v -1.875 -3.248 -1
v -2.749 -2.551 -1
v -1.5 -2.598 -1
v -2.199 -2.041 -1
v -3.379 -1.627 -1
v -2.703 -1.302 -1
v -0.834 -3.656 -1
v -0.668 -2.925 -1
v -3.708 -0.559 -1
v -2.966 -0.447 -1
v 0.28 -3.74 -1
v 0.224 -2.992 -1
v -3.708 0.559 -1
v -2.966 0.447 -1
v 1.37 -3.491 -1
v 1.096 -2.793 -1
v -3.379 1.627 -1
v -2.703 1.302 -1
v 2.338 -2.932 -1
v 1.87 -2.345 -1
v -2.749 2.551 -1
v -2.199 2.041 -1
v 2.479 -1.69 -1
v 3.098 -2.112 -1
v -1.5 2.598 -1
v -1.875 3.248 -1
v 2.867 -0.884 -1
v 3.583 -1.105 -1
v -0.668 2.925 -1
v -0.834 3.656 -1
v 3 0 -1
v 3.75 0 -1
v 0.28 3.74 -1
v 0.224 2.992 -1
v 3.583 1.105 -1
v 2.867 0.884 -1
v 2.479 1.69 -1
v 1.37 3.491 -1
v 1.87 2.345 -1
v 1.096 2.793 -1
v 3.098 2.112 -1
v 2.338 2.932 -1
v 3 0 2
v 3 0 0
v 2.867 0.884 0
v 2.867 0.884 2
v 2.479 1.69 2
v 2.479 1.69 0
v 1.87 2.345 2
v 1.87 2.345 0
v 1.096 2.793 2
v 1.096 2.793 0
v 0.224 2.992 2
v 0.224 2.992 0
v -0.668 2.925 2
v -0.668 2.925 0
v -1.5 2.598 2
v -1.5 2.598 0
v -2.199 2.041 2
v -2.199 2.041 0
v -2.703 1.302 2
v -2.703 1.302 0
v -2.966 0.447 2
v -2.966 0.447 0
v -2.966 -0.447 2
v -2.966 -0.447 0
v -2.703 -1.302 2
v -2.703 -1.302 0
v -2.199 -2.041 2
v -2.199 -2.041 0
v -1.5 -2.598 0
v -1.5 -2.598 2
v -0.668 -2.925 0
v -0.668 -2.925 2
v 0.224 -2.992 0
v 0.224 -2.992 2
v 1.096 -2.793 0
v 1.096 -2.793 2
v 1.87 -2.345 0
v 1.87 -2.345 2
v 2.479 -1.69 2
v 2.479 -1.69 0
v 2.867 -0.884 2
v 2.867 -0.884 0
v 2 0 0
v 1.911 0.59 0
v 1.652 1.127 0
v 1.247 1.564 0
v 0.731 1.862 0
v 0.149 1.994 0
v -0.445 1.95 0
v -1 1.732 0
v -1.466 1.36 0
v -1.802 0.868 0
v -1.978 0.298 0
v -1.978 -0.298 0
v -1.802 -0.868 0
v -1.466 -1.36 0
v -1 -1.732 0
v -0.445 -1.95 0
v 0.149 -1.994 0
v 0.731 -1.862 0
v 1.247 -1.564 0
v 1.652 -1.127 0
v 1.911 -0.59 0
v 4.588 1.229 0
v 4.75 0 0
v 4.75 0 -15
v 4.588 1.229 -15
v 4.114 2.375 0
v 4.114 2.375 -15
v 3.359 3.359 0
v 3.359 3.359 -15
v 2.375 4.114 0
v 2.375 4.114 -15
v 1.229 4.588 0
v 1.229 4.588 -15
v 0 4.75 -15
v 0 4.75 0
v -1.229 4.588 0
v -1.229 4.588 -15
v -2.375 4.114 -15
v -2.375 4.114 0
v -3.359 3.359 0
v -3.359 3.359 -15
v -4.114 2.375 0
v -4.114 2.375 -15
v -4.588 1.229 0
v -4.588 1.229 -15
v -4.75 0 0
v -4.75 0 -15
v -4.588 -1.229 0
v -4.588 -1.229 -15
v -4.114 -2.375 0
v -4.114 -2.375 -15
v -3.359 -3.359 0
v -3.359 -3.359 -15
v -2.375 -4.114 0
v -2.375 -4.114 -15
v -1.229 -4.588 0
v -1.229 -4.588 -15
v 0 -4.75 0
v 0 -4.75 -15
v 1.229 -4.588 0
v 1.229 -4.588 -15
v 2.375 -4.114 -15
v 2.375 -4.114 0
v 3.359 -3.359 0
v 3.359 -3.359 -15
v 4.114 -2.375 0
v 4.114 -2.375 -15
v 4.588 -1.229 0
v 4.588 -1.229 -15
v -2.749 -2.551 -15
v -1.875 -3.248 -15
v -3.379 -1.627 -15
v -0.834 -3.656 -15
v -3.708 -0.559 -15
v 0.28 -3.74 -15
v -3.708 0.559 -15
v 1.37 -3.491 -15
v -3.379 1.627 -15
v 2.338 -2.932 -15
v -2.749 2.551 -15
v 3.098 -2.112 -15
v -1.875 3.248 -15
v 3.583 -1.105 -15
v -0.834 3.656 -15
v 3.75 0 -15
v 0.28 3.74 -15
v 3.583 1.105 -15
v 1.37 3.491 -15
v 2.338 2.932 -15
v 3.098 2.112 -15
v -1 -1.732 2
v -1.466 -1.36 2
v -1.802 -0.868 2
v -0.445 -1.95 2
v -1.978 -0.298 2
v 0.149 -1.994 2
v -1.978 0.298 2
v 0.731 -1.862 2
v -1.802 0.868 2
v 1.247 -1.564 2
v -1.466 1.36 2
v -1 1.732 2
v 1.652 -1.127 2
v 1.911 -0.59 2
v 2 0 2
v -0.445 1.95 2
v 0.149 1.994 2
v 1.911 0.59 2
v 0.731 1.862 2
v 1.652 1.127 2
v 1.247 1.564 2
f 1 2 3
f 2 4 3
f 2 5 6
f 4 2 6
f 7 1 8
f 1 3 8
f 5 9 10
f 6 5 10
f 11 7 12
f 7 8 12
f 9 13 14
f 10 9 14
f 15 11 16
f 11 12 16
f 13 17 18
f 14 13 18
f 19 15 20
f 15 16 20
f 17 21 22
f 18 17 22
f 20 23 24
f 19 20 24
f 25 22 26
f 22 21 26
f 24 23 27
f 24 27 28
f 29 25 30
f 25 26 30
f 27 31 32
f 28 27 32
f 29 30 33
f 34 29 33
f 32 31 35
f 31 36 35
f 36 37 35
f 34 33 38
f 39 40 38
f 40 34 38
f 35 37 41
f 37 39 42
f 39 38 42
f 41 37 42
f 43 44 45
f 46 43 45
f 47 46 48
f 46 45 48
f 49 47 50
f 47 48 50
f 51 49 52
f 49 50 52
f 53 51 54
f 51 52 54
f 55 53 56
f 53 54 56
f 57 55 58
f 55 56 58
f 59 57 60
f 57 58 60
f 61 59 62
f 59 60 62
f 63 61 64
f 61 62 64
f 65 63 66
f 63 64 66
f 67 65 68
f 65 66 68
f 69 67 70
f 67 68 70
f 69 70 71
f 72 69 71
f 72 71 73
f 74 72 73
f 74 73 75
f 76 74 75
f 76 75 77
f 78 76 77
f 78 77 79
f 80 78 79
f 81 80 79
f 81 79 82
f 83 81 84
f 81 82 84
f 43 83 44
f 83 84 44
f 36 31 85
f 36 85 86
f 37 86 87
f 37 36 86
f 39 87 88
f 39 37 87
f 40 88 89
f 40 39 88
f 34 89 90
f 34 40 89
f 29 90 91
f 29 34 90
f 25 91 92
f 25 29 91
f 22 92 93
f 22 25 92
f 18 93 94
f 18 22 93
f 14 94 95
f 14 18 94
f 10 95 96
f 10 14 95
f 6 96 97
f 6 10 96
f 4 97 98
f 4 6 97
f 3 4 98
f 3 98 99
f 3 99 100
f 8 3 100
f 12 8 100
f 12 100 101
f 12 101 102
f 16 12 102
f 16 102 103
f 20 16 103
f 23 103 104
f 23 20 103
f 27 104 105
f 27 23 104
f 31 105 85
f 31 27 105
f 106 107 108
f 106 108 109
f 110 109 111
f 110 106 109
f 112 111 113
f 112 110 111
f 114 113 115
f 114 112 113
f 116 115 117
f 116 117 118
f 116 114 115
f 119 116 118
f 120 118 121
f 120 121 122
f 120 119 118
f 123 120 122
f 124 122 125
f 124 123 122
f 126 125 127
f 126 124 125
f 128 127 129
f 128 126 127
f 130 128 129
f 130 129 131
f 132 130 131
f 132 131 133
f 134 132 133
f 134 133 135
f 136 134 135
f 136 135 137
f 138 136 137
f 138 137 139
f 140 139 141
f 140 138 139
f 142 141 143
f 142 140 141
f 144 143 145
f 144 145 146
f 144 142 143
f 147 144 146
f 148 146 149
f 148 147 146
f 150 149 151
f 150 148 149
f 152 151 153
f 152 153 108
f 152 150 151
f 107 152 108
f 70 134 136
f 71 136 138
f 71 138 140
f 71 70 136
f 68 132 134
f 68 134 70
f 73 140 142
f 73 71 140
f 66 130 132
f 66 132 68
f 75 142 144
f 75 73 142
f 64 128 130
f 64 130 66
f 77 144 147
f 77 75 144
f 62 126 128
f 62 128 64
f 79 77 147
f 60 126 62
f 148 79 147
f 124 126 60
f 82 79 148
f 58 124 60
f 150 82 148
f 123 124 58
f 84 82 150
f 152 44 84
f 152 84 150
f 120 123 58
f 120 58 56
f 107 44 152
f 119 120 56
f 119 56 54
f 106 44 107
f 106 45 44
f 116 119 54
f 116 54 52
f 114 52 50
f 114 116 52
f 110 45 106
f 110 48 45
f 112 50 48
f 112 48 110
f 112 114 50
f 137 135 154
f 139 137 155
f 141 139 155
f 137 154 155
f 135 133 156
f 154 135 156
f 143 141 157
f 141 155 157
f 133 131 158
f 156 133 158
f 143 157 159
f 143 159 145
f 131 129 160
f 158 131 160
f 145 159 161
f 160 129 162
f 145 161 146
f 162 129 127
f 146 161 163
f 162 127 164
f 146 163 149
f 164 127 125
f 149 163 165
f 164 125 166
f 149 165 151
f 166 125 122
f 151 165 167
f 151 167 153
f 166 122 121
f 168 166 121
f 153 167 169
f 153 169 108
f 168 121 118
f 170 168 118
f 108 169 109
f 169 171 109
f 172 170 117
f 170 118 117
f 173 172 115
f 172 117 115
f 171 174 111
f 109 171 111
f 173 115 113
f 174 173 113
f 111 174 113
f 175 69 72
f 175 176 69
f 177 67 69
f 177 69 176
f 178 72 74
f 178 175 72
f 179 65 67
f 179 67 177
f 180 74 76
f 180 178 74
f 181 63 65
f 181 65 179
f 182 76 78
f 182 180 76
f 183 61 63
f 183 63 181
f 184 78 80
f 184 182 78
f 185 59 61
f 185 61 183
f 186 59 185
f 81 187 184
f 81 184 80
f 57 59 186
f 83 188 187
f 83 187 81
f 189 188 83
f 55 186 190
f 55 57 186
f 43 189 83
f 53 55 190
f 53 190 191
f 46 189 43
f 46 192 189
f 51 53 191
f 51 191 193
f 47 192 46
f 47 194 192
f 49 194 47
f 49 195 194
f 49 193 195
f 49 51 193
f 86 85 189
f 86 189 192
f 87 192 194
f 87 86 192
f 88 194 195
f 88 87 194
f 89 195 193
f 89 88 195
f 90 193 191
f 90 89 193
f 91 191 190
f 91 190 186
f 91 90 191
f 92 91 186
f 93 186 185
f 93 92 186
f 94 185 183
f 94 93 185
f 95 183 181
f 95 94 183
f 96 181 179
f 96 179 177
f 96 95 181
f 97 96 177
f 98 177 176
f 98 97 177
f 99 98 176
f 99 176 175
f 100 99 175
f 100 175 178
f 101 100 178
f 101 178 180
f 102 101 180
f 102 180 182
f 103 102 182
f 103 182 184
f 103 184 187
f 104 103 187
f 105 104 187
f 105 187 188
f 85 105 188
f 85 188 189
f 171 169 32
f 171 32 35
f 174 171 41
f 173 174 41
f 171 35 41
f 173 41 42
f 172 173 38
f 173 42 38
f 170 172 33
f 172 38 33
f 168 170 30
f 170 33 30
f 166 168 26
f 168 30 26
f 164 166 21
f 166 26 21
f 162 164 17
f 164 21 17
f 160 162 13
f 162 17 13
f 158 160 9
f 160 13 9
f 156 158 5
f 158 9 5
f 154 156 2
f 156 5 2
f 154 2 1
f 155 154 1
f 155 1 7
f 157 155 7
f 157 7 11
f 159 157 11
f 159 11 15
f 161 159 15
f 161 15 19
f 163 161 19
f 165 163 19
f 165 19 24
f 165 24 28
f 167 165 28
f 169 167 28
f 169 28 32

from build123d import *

# Parameters (mm, degrees)
F0_R     = 4.75
F0_R_2   = 3.75
F1_DEPTH = 15
F0_R_3   = 3
F0_R_4   = 2
F2_DEPTH = 1
F3_DEPTH = 2
F4_SIZE2 = 1
F4_SIZE  = 1


with BuildPart() as f1:
    # F0 (on Top) → F1 (new body)
    with BuildSketch(Plane.XY):
        Circle(F0_R)
        Circle(F0_R_2, mode=Mode.SUBTRACT)
    extrude(amount=-F1_DEPTH)

    # F0 (on Top) → F2 (join)
    with BuildSketch(Plane.XY):
        Circle(F0_R_2)
        Circle(F0_R_3, mode=Mode.SUBTRACT)
        Circle(F0_R_3)
        Circle(F0_R_4, mode=Mode.SUBTRACT)
    extrude(amount=-F2_DEPTH)

    # F0 (on Top) → F3 (join)
    with BuildSketch(Plane.XY):
        Circle(F0_R_3)
        Circle(F0_R_4, mode=Mode.SUBTRACT)
    extrude(amount=F3_DEPTH)

    # F4
    f4_edges = [f1.edges().sort_by_distance(p)[0] for p in [
        (-2, 0, -1),
    ]]
    chamfer(f4_edges, length=F4_SIZE, length2=F4_SIZE2)


solid = f1.part
